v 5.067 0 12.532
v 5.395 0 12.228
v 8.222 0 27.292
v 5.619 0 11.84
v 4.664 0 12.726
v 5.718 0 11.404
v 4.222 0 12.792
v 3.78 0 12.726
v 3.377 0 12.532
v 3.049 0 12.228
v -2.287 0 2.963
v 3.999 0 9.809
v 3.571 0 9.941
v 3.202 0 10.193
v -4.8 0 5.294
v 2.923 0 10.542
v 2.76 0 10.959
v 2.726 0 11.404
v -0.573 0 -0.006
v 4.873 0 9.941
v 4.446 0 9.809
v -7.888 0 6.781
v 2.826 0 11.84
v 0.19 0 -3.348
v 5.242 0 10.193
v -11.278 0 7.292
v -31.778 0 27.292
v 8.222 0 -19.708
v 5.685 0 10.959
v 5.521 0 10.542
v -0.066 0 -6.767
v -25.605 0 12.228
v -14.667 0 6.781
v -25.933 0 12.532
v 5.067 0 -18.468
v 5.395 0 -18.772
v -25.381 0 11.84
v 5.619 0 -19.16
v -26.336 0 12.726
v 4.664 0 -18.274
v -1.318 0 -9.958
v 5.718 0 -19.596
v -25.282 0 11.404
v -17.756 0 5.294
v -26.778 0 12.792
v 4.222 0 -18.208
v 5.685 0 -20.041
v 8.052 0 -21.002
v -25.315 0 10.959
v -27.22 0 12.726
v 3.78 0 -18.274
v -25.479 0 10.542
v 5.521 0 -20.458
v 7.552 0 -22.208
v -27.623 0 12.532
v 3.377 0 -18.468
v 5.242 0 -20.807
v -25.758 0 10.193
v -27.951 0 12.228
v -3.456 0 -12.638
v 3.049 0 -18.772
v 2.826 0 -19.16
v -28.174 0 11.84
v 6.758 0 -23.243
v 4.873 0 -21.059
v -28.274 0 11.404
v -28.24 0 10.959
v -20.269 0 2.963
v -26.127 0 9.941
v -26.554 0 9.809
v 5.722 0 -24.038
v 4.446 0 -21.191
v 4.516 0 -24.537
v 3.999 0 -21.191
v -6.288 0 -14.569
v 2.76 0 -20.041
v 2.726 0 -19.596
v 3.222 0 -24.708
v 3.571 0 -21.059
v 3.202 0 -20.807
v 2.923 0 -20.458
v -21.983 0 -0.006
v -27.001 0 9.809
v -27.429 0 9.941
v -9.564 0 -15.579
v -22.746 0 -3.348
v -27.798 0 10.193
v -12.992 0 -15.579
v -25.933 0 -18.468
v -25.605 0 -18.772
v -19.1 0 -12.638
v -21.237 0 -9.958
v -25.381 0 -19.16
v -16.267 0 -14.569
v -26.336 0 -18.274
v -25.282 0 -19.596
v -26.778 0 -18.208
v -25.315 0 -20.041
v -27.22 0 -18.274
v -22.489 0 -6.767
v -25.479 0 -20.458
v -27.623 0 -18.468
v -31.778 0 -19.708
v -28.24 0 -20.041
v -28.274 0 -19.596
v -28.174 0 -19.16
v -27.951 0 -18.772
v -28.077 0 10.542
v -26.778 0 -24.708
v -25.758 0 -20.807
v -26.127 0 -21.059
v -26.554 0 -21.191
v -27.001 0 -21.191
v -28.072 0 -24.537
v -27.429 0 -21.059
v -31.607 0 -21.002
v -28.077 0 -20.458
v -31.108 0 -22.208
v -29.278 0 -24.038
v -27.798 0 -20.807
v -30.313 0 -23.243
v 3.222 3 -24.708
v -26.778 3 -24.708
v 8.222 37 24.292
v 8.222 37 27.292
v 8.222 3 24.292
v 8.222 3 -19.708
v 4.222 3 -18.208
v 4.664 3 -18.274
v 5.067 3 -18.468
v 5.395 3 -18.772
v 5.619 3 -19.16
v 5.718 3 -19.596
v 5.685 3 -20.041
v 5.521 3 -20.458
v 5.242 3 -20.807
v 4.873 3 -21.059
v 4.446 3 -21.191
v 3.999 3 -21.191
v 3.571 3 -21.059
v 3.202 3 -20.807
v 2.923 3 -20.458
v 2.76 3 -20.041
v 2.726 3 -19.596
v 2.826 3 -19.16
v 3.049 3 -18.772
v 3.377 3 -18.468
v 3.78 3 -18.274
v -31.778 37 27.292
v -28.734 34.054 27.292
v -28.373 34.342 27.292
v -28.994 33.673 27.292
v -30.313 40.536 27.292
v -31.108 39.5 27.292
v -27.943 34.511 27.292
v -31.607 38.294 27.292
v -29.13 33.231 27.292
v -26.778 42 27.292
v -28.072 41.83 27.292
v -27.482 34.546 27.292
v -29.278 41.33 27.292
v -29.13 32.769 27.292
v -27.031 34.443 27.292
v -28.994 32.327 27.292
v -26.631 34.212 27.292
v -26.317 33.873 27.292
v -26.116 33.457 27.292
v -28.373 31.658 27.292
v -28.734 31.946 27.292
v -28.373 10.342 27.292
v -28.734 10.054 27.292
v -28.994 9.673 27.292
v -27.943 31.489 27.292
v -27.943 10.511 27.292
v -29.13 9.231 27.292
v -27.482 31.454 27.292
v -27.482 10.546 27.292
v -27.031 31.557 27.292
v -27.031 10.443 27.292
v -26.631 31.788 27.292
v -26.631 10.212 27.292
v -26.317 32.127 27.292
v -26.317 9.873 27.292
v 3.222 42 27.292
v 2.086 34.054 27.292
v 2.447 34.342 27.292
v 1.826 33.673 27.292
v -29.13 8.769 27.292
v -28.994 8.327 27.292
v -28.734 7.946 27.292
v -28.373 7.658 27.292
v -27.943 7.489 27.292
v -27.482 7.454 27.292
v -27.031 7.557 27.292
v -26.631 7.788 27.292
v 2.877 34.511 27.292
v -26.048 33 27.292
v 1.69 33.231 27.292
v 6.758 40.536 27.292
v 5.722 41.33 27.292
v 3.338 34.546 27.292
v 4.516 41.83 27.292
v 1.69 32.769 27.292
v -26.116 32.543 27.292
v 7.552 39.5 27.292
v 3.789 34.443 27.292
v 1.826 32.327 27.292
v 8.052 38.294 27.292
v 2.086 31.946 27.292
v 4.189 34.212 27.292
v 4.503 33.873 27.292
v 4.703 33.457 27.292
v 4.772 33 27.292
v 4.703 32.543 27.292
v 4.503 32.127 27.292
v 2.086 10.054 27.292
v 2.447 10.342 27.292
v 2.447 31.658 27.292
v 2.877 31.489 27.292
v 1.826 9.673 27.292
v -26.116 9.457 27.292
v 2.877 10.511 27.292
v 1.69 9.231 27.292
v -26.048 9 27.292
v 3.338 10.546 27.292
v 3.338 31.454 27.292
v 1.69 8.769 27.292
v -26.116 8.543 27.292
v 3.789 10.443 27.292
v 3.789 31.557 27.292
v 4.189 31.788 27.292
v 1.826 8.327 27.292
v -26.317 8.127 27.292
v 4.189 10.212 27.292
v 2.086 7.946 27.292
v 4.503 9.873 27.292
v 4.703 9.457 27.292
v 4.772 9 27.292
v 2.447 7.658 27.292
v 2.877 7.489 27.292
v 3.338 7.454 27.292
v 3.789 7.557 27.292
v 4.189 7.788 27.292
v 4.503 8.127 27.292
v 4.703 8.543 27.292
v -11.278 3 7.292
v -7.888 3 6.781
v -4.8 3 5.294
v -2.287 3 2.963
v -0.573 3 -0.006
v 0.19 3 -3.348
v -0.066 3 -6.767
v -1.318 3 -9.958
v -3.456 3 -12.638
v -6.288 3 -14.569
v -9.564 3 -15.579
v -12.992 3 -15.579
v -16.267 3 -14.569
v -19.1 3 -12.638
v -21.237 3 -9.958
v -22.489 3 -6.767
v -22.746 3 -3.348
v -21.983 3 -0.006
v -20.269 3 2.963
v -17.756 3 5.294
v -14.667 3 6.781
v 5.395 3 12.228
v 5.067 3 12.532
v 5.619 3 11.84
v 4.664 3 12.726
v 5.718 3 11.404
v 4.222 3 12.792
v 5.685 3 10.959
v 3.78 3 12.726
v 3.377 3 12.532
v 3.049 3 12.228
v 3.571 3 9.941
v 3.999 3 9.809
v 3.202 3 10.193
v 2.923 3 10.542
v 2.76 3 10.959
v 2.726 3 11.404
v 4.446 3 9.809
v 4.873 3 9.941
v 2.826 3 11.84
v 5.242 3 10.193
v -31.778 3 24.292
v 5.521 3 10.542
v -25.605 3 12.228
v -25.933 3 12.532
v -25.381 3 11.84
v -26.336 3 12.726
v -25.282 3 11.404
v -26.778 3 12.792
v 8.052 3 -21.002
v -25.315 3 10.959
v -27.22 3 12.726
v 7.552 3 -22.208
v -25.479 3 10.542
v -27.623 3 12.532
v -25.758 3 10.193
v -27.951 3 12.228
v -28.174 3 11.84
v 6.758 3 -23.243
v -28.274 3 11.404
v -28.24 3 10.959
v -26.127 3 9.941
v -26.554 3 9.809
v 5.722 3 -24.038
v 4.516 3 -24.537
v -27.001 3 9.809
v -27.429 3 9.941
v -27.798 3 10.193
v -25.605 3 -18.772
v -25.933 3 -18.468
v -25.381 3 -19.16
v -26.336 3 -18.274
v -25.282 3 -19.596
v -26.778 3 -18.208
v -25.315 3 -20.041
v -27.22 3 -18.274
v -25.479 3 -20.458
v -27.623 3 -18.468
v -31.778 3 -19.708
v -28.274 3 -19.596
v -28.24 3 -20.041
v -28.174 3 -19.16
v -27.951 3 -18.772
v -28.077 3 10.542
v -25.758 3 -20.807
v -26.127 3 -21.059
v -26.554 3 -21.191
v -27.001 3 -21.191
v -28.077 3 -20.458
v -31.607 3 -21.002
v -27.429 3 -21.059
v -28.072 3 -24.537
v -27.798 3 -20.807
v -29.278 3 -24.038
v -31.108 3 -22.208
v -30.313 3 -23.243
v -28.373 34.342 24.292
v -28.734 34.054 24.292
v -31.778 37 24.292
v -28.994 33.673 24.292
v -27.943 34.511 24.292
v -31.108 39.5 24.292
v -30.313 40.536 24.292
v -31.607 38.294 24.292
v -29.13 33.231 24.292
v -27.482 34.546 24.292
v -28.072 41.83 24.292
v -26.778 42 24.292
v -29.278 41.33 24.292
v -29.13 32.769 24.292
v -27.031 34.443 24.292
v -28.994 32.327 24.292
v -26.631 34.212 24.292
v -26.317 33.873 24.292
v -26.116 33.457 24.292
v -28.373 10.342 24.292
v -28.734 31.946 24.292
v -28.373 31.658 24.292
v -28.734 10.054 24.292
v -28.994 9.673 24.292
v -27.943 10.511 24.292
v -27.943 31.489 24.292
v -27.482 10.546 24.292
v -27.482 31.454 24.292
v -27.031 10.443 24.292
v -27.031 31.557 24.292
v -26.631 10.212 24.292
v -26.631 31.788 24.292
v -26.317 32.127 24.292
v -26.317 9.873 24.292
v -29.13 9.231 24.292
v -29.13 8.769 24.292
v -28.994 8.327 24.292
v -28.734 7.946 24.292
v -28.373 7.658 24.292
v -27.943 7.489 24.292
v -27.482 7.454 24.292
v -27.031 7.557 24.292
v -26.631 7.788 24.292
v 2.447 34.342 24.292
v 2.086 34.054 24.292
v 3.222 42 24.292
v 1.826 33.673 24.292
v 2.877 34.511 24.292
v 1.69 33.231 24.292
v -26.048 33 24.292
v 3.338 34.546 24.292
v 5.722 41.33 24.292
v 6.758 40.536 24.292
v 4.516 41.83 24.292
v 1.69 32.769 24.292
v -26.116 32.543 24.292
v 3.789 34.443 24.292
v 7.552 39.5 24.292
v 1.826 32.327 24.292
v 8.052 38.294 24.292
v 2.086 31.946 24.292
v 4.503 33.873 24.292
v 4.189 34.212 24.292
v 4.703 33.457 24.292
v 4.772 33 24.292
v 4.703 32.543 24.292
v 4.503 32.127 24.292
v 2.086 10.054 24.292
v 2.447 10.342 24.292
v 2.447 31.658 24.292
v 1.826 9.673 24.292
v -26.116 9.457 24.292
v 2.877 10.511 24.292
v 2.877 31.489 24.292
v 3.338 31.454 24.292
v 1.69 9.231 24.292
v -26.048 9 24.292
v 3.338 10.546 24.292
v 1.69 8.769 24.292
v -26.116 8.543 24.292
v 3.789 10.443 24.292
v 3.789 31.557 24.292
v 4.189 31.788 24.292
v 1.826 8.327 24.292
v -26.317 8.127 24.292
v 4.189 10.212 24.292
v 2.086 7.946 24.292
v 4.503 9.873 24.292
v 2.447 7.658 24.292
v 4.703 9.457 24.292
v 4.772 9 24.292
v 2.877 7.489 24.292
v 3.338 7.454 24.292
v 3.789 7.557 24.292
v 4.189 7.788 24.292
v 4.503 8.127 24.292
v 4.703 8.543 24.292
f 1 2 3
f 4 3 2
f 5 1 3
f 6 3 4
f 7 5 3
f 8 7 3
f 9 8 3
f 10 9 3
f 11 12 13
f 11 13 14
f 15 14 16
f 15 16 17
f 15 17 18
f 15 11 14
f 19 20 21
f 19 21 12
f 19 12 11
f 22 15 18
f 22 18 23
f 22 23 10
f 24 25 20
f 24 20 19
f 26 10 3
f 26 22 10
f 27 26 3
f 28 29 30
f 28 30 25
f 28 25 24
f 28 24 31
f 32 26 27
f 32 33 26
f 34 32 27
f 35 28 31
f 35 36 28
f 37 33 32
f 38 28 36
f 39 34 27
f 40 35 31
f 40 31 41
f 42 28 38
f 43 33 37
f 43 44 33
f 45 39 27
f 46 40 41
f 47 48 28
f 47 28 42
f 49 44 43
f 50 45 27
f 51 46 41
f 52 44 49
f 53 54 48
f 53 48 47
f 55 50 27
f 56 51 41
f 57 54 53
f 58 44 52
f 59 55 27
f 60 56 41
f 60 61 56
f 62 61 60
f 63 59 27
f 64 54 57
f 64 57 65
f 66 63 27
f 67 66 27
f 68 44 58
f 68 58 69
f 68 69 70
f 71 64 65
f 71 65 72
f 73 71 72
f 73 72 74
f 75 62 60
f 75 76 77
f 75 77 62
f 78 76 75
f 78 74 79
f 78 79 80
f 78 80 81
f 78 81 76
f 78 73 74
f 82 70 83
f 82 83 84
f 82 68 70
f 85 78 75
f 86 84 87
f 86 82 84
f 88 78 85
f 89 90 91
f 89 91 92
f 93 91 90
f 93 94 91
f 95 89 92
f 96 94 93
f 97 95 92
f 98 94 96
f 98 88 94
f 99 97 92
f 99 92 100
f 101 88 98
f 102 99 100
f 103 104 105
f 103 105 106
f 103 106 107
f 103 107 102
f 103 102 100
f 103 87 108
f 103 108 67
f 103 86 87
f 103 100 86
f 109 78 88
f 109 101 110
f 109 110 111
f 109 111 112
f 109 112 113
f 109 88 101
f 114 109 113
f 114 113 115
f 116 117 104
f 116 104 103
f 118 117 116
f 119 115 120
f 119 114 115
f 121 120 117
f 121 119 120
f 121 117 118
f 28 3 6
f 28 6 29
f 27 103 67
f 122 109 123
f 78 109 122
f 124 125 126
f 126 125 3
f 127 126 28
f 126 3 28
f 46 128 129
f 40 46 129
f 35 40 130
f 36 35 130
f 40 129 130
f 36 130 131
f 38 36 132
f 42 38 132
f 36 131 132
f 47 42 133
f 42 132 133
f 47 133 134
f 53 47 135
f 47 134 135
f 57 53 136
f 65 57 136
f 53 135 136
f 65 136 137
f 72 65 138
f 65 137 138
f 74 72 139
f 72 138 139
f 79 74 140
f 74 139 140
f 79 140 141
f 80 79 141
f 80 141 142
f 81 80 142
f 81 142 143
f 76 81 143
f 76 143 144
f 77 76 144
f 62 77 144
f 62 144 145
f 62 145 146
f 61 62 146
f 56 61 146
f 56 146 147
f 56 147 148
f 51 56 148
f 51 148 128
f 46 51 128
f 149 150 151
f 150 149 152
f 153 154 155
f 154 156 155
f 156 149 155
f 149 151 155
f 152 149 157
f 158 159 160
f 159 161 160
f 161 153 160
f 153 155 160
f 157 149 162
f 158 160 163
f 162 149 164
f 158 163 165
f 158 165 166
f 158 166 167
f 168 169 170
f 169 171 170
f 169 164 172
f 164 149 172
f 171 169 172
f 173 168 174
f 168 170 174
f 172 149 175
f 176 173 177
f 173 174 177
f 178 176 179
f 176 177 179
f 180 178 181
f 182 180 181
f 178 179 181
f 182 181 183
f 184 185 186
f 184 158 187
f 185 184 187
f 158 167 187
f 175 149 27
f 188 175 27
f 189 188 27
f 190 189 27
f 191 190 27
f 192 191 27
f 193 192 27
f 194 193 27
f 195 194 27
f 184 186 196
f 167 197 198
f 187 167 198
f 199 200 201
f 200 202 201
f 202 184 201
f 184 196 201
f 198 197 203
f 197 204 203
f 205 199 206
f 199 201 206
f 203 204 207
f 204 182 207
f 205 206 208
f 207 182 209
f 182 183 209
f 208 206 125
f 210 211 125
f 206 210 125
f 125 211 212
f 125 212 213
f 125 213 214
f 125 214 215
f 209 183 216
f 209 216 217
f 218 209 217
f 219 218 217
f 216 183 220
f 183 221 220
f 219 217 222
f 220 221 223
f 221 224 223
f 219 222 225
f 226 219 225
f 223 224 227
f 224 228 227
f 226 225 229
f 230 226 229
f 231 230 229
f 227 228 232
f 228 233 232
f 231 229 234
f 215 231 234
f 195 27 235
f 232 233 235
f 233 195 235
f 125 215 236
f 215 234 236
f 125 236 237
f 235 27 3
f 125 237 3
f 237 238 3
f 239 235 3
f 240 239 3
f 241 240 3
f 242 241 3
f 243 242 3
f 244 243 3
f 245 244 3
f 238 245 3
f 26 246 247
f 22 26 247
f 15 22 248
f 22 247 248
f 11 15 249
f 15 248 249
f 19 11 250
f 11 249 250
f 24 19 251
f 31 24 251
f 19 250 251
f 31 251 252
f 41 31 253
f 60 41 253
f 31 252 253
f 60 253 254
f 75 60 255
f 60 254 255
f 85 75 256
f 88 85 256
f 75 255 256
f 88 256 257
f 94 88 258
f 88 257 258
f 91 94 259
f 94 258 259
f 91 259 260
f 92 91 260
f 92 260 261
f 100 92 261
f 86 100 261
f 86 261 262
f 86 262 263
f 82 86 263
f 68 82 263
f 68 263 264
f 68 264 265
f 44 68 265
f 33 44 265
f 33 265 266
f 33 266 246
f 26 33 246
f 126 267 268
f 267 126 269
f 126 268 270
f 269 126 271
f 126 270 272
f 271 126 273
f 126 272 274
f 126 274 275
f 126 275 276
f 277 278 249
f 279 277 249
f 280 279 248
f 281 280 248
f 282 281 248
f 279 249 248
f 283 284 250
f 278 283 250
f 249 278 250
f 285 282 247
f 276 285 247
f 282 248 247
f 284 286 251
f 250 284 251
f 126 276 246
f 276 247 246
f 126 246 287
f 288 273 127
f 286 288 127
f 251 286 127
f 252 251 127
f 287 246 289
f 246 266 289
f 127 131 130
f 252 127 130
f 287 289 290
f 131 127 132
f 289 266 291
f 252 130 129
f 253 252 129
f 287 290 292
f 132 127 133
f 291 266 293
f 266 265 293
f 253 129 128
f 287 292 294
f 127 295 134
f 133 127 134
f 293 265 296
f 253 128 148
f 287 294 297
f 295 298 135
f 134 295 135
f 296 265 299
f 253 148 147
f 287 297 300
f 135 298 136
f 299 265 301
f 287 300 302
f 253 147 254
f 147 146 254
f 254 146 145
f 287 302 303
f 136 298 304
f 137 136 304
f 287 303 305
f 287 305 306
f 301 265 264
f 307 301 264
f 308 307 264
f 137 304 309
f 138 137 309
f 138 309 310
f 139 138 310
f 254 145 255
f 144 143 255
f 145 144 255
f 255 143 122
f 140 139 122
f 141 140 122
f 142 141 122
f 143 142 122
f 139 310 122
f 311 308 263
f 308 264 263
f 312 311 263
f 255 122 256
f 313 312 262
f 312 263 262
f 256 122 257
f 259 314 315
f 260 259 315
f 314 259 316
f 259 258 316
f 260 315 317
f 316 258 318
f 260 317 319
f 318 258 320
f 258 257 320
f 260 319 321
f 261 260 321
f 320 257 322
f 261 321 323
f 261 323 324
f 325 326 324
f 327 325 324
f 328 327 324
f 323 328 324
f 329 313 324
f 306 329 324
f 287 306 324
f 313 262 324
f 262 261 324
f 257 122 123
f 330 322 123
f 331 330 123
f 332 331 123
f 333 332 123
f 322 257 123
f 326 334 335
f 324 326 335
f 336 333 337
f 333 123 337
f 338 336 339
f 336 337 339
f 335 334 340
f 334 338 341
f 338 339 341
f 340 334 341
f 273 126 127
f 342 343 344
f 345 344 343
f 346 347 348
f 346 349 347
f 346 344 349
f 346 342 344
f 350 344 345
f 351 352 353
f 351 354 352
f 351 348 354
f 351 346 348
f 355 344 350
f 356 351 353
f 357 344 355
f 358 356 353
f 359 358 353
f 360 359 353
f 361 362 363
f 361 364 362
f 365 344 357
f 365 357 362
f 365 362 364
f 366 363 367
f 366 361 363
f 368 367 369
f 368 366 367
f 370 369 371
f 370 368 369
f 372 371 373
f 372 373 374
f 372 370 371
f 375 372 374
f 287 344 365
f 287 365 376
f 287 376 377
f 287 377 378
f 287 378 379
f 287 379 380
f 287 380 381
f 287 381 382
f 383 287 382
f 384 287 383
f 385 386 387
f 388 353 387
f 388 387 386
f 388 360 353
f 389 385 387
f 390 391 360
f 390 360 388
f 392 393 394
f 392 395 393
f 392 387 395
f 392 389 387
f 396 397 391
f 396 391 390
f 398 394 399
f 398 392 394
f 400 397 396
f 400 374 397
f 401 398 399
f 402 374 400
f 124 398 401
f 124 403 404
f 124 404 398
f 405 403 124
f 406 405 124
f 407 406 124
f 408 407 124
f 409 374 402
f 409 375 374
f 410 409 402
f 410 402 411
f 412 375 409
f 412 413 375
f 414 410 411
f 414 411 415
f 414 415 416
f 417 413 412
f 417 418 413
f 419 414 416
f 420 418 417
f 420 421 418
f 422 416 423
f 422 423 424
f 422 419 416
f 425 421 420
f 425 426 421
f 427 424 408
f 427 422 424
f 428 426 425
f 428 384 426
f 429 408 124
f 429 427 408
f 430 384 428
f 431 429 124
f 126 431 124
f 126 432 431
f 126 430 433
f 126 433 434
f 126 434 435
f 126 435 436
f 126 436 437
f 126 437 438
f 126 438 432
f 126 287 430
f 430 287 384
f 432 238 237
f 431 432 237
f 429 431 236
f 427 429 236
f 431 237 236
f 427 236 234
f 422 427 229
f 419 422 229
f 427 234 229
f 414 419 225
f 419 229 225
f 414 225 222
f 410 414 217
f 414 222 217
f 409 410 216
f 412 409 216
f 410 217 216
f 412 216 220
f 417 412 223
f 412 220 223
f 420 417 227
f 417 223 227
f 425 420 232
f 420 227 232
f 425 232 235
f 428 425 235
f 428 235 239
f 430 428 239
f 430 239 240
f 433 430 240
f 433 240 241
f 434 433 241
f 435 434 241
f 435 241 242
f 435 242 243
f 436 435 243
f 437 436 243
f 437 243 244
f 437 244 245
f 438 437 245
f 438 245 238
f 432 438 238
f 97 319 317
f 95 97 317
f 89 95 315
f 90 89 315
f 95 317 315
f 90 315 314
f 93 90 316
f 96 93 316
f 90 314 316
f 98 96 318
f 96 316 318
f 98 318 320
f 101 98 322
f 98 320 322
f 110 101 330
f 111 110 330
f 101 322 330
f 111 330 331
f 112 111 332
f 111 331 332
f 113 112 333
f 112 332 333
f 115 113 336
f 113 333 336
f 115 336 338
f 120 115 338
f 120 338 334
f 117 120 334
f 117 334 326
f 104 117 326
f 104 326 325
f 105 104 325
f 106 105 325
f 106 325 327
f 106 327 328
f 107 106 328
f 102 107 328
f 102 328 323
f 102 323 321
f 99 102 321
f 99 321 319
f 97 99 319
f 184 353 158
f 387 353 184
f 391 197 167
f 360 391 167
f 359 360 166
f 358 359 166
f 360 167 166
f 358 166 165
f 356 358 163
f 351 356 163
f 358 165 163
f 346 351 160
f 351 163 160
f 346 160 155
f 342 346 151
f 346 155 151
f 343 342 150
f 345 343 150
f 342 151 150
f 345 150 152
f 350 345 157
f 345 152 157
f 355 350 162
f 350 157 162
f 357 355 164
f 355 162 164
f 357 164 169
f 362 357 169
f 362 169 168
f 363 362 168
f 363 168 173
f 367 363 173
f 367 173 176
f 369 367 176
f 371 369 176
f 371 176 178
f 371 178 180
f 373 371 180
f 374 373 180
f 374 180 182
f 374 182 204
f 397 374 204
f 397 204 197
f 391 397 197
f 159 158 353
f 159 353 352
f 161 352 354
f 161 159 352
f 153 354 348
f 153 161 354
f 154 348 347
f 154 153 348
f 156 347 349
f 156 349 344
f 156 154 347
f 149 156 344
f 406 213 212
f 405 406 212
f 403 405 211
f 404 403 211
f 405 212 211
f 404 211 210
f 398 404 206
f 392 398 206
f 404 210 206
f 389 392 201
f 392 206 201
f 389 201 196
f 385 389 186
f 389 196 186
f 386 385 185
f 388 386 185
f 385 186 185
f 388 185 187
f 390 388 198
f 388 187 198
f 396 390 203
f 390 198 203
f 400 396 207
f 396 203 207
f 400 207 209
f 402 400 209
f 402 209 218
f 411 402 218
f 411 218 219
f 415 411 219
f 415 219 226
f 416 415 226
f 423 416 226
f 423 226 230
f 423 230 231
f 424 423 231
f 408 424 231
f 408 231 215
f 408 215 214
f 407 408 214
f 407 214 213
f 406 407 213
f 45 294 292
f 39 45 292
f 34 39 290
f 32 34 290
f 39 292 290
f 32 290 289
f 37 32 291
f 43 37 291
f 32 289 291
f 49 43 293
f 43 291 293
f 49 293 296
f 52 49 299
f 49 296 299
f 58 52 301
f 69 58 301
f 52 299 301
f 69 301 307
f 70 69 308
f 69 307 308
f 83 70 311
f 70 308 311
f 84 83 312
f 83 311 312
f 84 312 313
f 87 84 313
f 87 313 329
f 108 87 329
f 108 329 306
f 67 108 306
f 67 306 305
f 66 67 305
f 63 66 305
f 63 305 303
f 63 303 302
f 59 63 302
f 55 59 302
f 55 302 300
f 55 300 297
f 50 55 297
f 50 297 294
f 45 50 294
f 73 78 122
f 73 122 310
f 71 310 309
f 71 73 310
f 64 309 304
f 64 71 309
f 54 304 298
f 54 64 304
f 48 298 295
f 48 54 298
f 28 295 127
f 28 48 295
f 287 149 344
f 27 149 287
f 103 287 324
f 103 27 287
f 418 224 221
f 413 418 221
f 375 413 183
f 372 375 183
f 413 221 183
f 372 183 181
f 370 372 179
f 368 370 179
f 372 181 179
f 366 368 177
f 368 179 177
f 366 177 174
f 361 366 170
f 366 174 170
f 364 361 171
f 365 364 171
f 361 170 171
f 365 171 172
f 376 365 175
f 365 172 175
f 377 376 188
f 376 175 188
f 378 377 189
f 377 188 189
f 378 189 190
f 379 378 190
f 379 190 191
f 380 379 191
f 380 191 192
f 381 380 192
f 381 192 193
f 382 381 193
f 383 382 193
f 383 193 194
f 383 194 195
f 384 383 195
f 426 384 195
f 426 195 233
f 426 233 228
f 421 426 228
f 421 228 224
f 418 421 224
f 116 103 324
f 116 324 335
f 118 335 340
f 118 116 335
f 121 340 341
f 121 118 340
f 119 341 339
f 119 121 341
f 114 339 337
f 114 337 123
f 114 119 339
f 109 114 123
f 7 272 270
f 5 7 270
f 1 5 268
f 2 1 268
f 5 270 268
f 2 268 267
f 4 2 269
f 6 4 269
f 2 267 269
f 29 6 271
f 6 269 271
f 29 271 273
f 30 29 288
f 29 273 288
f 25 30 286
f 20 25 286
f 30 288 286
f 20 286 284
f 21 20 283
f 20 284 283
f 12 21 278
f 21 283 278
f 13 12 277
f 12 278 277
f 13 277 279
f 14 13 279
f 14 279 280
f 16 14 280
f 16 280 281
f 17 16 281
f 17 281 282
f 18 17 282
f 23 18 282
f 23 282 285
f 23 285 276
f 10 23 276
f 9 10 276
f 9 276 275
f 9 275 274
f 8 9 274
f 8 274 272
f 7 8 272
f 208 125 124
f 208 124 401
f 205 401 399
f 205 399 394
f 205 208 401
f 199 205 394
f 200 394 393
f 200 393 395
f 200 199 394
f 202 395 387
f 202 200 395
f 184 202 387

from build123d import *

# Parameters (mm, degrees)
EXTRUDE_1_DEPTH     = 3
SKETCH_3_W          = 40
SKETCH_3_H          = 3
EXTRUDE_2_DEPTH     = 39
CUT_EXTRUDE_1_REACH = 76.012
CUT_EXTRUDE_2_REACH = 59.234
SKETCH_5_R          = 1.5
SKETCH_5_R_2        = 11.5
CUT_EXTRUDE_3_REACH = 76.012
SKETCH_6_R          = 1.55


with BuildPart() as part:
    # 草图2 → 凸台-拉伸1 (new body)
    with BuildSketch(Plane(origin=(0, 0, 0), x_dir=(1, 0, 0), z_dir=(0, 1, 0))):
        with BuildLine():
            Line((-26.777777778, 24.707602339), (3.222222222, 24.707602339))
            ThreePointArc((3.222222222, 24.707602339), (6.757756128, 23.243136245), (8.222222222, 19.707602339))
            Line((8.222222222, 19.707602339), (8.222222222, -27.292397661))
            Line((8.222222222, -27.292397661), (-31.777777778, -27.292397661))
            Line((-31.777777778, -27.292397661), (-31.777777778, 19.707602339))
            ThreePointArc((-31.777777778, 19.707602339), (-30.313311684, 23.243136245), (-26.777777778, 24.707602339))
        make_face()
    extrude(amount=EXTRUDE_1_DEPTH)

    # 草图3 → 凸台-拉伸2 (add)
    with BuildSketch(Plane(origin=(0, 3, 0), x_dir=(1, 0, 0), z_dir=(0, 1, 0))):
        with Locations((-11.777777778, -25.792397661)):
            Rectangle(SKETCH_3_W, SKETCH_3_H)
    extrude(amount=EXTRUDE_2_DEPTH)

    # 草图4 → 切除-拉伸1 (cut, up to next)
    with BuildSketch(Plane.XY.offset(27.292397661), mode=Mode.PRIVATE) as cut_extrude_1_sk1:
        with BuildLine():
            Line((-31.777777778, 37), (-31.777777778, 42))
            Line((-31.777777778, 42), (-26.777777778, 42))
            ThreePointArc((-26.777777778, 42), (-30.313311684, 40.535533906), (-31.777777778, 37))
        make_face()
    cut_extrude_1_tool1 = extrude(cut_extrude_1_sk1.sketch, amount=-CUT_EXTRUDE_1_REACH, mode=Mode.PRIVATE) & part.part
    # 草图4 → 切除-拉伸1 (cut, up to next)
    with BuildSketch(Plane.XY.offset(27.292397661), mode=Mode.PRIVATE) as cut_extrude_1_sk2:
        with BuildLine():
            Line((3.222222222, 42), (8.222222222, 42))
            Line((8.222222222, 42), (8.222222222, 37))
            ThreePointArc((8.222222222, 37), (6.757756128, 40.535533906), (3.222222222, 42))
        make_face()
    cut_extrude_1_tool2 = extrude(cut_extrude_1_sk2.sketch, amount=-CUT_EXTRUDE_1_REACH, mode=Mode.PRIVATE) & part.part
    add(cut_extrude_1_tool1.solids().sort_by_distance((-30.660938, 40.88316, 27.292398))[0], mode=Mode.SUBTRACT)
    add(cut_extrude_1_tool2.solids().sort_by_distance((7.105383, 40.88316, 27.292398))[0], mode=Mode.SUBTRACT)

    # 草图5 → 切除-拉伸2 (cut, up to next)
    with BuildSketch(Plane(origin=(0, 3, 0), x_dir=(1, 0, 0), z_dir=(0, 1, 0)), mode=Mode.PRIVATE) as cut_extrude_2_sk1:
        with Locations(Location((-26.777777778, 19.707602339, 0), (0, 0, 270))):
            Circle(SKETCH_5_R)
    cut_extrude_2_tool1 = extrude(cut_extrude_2_sk1.sketch, amount=-CUT_EXTRUDE_2_REACH, mode=Mode.PRIVATE) & part.part
    # 草图5 → 切除-拉伸2 (cut, up to next)
    with BuildSketch(Plane(origin=(0, 3, 0), x_dir=(1, 0, 0), z_dir=(0, 1, 0)), mode=Mode.PRIVATE) as cut_extrude_2_sk2:
        with Locations(Location((4.222222222, 19.707602339, 0), (0, 0, 270))):
            Circle(SKETCH_5_R)
    cut_extrude_2_tool2 = extrude(cut_extrude_2_sk2.sketch, amount=-CUT_EXTRUDE_2_REACH, mode=Mode.PRIVATE) & part.part
    # 草图5 → 切除-拉伸2 (cut, up to next)
    with BuildSketch(Plane(origin=(0, 3, 0), x_dir=(1, 0, 0), z_dir=(0, 1, 0)), mode=Mode.PRIVATE) as cut_extrude_2_sk3:
        with Locations(Location((-26.777777778, -11.292397661, 0), (0, 0, 270))):
            Circle(SKETCH_5_R)
    cut_extrude_2_tool3 = extrude(cut_extrude_2_sk3.sketch, amount=-CUT_EXTRUDE_2_REACH, mode=Mode.PRIVATE) & part.part
    # 草图5 → 切除-拉伸2 (cut, up to next)
    with BuildSketch(Plane(origin=(0, 3, 0), x_dir=(1, 0, 0), z_dir=(0, 1, 0)), mode=Mode.PRIVATE) as cut_extrude_2_sk4:
        with Locations(Location((4.222222222, -11.292397661, 0), (0, 0, 270))):
            Circle(SKETCH_5_R)
    cut_extrude_2_tool4 = extrude(cut_extrude_2_sk4.sketch, amount=-CUT_EXTRUDE_2_REACH, mode=Mode.PRIVATE) & part.part
    # 草图5 → 切除-拉伸2 (cut, up to next)
    with BuildSketch(Plane(origin=(0, 3, 0), x_dir=(1, 0, 0), z_dir=(0, 1, 0)), mode=Mode.PRIVATE) as cut_extrude_2_sk5:
        with Locations(Location((-11.277777778, 4.207602339, 0), (0, 0, 270))):
            Circle(SKETCH_5_R_2)
    cut_extrude_2_tool5 = extrude(cut_extrude_2_sk5.sketch, amount=-CUT_EXTRUDE_2_REACH, mode=Mode.PRIVATE) & part.part
    add(cut_extrude_2_tool1.solids().sort_by_distance((-26.777778, 3, -19.707602))[0], mode=Mode.SUBTRACT)
    add(cut_extrude_2_tool2.solids().sort_by_distance((4.222222, 3, -19.707602))[0], mode=Mode.SUBTRACT)
    add(cut_extrude_2_tool3.solids().sort_by_distance((-26.777778, 3, 11.292398))[0], mode=Mode.SUBTRACT)
    add(cut_extrude_2_tool4.solids().sort_by_distance((4.222222, 3, 11.292398))[0], mode=Mode.SUBTRACT)
    add(cut_extrude_2_tool5.solids().sort_by_distance((-11.277778, 3, -4.207602))[0], mode=Mode.SUBTRACT)

    # 草图6 → 切除-拉伸3 (cut, up to next)
    with BuildSketch(Plane.XY.offset(27.292397661), mode=Mode.PRIVATE) as cut_extrude_3_sk1:
        with Locations((-27.59761171, 9)):
            Circle(SKETCH_6_R)
    cut_extrude_3_tool1 = extrude(cut_extrude_3_sk1.sketch, amount=-CUT_EXTRUDE_3_REACH, mode=Mode.PRIVATE) & part.part
    # 草图6 → 切除-拉伸3 (cut, up to next)
    with BuildSketch(Plane.XY.offset(27.292397661), mode=Mode.PRIVATE) as cut_extrude_3_sk2:
        with Locations((-27.59761171, 33)):
            Circle(SKETCH_6_R)
    cut_extrude_3_tool2 = extrude(cut_extrude_3_sk2.sketch, amount=-CUT_EXTRUDE_3_REACH, mode=Mode.PRIVATE) & part.part
    # 草图6 → 切除-拉伸3 (cut, up to next)
    with BuildSketch(Plane.XY.offset(27.292397661), mode=Mode.PRIVATE) as cut_extrude_3_sk3:
        with Locations((3.222222222, 9)):
            Circle(SKETCH_6_R)
    cut_extrude_3_tool3 = extrude(cut_extrude_3_sk3.sketch, amount=-CUT_EXTRUDE_3_REACH, mode=Mode.PRIVATE) & part.part
    # 草图6 → 切除-拉伸3 (cut, up to next)
    with BuildSketch(Plane.XY.offset(27.292397661), mode=Mode.PRIVATE) as cut_extrude_3_sk4:
        with Locations((3.222222222, 33)):
            Circle(SKETCH_6_R)
    cut_extrude_3_tool4 = extrude(cut_extrude_3_sk4.sketch, amount=-CUT_EXTRUDE_3_REACH, mode=Mode.PRIVATE) & part.part
    add(cut_extrude_3_tool1.solids().sort_by_distance((-27.597612, 9, 27.292398))[0], mode=Mode.SUBTRACT)
    add(cut_extrude_3_tool2.solids().sort_by_distance((-27.597612, 33, 27.292398))[0], mode=Mode.SUBTRACT)
    add(cut_extrude_3_tool3.solids().sort_by_distance((3.222222, 9, 27.292398))[0], mode=Mode.SUBTRACT)
    add(cut_extrude_3_tool4.solids().sort_by_distance((3.222222, 33, 27.292398))[0], mode=Mode.SUBTRACT)


solid = part.part
